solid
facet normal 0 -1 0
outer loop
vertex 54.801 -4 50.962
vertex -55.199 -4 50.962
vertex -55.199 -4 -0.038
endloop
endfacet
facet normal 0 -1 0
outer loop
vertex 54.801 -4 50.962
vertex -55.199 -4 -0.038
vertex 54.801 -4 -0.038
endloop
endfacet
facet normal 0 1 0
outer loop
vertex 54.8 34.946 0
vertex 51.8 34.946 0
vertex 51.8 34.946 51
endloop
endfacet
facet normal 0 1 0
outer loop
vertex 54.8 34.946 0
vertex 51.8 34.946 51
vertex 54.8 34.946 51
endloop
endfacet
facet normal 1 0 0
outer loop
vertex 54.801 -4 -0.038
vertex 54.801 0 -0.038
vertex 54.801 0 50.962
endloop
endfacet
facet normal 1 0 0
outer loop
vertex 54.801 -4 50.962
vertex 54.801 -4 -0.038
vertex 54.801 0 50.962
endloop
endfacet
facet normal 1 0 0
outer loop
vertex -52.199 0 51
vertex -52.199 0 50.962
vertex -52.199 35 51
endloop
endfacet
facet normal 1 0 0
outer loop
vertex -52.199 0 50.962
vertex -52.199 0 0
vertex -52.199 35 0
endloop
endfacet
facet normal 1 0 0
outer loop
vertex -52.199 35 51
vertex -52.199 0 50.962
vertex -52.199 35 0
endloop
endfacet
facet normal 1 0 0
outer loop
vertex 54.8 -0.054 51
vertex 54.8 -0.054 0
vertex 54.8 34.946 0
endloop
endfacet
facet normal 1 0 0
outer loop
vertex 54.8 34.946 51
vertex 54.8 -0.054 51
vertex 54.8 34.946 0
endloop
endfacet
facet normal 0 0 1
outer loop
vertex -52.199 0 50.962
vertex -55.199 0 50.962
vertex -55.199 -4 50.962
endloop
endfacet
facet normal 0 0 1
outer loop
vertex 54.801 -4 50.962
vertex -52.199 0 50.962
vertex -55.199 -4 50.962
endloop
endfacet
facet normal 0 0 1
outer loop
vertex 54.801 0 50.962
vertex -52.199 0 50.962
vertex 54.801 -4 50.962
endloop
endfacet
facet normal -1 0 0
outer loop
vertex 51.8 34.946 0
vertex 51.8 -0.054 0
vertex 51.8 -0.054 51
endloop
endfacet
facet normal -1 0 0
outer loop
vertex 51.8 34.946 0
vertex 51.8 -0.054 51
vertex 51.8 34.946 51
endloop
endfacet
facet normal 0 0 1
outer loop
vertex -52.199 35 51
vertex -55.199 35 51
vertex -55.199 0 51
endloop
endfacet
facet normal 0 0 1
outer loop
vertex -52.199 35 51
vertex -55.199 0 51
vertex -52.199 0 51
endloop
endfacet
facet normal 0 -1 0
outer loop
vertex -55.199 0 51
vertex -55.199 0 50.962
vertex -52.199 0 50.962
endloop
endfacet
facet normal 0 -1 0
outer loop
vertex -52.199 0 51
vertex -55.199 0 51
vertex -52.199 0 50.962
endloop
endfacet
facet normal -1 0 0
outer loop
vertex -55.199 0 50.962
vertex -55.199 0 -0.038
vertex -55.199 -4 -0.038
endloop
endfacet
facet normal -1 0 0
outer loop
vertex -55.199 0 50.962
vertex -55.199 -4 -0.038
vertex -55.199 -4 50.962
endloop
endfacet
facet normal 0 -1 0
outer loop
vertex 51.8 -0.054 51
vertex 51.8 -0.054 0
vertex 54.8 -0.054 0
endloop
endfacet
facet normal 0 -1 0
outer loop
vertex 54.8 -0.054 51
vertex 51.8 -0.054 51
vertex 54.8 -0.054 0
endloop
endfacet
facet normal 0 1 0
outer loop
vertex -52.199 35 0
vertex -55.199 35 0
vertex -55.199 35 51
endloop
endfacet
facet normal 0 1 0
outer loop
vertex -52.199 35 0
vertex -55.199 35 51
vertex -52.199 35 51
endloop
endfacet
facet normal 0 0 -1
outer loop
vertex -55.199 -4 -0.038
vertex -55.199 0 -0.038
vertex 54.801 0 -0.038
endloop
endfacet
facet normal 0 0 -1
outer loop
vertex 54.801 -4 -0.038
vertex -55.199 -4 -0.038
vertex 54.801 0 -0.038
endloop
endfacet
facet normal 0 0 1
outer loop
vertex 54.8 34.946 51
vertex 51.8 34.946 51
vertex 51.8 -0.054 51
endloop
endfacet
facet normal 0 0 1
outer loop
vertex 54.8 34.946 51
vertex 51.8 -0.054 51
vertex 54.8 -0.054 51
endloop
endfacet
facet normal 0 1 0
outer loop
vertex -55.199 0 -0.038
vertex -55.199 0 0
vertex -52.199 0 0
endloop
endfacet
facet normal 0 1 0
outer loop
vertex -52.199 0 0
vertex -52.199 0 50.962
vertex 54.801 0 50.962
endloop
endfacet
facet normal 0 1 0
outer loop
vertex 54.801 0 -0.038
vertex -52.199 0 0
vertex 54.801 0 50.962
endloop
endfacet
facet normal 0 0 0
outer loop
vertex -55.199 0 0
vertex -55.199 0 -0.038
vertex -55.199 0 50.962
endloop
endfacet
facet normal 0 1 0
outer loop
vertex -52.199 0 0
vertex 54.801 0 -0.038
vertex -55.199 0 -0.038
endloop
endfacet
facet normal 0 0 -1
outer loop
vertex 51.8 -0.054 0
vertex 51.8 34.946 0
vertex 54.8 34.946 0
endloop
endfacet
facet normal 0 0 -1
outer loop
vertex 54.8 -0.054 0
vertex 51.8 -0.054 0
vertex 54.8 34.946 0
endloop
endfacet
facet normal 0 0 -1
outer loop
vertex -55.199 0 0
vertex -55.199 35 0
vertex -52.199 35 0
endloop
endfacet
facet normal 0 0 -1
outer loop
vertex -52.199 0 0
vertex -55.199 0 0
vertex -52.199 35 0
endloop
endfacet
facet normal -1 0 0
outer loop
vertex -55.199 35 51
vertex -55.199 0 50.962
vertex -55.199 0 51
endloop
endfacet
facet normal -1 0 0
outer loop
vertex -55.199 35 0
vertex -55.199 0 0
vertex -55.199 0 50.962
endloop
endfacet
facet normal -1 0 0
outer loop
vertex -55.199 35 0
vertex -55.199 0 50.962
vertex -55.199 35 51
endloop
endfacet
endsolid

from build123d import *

# Parameters (mm, degrees)
F0_W     = 110
F0_H     = 51
F1_DEPTH = 4
F2_W     = 3
F2_H     = 35
F3_DEPTH = 51
F4_W     = 3
F4_H     = 35
F5_DEPTH = 51


with BuildPart() as f1:
    # F0 (on Front) → F1 (new body)
    with BuildSketch(Plane.XZ):
        with Locations((-0.199405, 25.461623)):
            Rectangle(F0_W, F0_H)
    extrude(amount=F1_DEPTH)

    # F2 (on Top) → F3 (join)
    with BuildSketch(Plane.XY):
        with Locations((-53.699395, 17.5)):
            Rectangle(F2_W, F2_H)
    extrude(amount=F3_DEPTH)


with BuildPart() as f5:
    # F4 (on Top) → F5 (new body)
    with BuildSketch(Plane.XY):
        with Locations((53.299694, 17.445809)):
            Rectangle(F4_W, F4_H)
    extrude(amount=F5_DEPTH)


solid = Compound([f1.part, f5.part])
